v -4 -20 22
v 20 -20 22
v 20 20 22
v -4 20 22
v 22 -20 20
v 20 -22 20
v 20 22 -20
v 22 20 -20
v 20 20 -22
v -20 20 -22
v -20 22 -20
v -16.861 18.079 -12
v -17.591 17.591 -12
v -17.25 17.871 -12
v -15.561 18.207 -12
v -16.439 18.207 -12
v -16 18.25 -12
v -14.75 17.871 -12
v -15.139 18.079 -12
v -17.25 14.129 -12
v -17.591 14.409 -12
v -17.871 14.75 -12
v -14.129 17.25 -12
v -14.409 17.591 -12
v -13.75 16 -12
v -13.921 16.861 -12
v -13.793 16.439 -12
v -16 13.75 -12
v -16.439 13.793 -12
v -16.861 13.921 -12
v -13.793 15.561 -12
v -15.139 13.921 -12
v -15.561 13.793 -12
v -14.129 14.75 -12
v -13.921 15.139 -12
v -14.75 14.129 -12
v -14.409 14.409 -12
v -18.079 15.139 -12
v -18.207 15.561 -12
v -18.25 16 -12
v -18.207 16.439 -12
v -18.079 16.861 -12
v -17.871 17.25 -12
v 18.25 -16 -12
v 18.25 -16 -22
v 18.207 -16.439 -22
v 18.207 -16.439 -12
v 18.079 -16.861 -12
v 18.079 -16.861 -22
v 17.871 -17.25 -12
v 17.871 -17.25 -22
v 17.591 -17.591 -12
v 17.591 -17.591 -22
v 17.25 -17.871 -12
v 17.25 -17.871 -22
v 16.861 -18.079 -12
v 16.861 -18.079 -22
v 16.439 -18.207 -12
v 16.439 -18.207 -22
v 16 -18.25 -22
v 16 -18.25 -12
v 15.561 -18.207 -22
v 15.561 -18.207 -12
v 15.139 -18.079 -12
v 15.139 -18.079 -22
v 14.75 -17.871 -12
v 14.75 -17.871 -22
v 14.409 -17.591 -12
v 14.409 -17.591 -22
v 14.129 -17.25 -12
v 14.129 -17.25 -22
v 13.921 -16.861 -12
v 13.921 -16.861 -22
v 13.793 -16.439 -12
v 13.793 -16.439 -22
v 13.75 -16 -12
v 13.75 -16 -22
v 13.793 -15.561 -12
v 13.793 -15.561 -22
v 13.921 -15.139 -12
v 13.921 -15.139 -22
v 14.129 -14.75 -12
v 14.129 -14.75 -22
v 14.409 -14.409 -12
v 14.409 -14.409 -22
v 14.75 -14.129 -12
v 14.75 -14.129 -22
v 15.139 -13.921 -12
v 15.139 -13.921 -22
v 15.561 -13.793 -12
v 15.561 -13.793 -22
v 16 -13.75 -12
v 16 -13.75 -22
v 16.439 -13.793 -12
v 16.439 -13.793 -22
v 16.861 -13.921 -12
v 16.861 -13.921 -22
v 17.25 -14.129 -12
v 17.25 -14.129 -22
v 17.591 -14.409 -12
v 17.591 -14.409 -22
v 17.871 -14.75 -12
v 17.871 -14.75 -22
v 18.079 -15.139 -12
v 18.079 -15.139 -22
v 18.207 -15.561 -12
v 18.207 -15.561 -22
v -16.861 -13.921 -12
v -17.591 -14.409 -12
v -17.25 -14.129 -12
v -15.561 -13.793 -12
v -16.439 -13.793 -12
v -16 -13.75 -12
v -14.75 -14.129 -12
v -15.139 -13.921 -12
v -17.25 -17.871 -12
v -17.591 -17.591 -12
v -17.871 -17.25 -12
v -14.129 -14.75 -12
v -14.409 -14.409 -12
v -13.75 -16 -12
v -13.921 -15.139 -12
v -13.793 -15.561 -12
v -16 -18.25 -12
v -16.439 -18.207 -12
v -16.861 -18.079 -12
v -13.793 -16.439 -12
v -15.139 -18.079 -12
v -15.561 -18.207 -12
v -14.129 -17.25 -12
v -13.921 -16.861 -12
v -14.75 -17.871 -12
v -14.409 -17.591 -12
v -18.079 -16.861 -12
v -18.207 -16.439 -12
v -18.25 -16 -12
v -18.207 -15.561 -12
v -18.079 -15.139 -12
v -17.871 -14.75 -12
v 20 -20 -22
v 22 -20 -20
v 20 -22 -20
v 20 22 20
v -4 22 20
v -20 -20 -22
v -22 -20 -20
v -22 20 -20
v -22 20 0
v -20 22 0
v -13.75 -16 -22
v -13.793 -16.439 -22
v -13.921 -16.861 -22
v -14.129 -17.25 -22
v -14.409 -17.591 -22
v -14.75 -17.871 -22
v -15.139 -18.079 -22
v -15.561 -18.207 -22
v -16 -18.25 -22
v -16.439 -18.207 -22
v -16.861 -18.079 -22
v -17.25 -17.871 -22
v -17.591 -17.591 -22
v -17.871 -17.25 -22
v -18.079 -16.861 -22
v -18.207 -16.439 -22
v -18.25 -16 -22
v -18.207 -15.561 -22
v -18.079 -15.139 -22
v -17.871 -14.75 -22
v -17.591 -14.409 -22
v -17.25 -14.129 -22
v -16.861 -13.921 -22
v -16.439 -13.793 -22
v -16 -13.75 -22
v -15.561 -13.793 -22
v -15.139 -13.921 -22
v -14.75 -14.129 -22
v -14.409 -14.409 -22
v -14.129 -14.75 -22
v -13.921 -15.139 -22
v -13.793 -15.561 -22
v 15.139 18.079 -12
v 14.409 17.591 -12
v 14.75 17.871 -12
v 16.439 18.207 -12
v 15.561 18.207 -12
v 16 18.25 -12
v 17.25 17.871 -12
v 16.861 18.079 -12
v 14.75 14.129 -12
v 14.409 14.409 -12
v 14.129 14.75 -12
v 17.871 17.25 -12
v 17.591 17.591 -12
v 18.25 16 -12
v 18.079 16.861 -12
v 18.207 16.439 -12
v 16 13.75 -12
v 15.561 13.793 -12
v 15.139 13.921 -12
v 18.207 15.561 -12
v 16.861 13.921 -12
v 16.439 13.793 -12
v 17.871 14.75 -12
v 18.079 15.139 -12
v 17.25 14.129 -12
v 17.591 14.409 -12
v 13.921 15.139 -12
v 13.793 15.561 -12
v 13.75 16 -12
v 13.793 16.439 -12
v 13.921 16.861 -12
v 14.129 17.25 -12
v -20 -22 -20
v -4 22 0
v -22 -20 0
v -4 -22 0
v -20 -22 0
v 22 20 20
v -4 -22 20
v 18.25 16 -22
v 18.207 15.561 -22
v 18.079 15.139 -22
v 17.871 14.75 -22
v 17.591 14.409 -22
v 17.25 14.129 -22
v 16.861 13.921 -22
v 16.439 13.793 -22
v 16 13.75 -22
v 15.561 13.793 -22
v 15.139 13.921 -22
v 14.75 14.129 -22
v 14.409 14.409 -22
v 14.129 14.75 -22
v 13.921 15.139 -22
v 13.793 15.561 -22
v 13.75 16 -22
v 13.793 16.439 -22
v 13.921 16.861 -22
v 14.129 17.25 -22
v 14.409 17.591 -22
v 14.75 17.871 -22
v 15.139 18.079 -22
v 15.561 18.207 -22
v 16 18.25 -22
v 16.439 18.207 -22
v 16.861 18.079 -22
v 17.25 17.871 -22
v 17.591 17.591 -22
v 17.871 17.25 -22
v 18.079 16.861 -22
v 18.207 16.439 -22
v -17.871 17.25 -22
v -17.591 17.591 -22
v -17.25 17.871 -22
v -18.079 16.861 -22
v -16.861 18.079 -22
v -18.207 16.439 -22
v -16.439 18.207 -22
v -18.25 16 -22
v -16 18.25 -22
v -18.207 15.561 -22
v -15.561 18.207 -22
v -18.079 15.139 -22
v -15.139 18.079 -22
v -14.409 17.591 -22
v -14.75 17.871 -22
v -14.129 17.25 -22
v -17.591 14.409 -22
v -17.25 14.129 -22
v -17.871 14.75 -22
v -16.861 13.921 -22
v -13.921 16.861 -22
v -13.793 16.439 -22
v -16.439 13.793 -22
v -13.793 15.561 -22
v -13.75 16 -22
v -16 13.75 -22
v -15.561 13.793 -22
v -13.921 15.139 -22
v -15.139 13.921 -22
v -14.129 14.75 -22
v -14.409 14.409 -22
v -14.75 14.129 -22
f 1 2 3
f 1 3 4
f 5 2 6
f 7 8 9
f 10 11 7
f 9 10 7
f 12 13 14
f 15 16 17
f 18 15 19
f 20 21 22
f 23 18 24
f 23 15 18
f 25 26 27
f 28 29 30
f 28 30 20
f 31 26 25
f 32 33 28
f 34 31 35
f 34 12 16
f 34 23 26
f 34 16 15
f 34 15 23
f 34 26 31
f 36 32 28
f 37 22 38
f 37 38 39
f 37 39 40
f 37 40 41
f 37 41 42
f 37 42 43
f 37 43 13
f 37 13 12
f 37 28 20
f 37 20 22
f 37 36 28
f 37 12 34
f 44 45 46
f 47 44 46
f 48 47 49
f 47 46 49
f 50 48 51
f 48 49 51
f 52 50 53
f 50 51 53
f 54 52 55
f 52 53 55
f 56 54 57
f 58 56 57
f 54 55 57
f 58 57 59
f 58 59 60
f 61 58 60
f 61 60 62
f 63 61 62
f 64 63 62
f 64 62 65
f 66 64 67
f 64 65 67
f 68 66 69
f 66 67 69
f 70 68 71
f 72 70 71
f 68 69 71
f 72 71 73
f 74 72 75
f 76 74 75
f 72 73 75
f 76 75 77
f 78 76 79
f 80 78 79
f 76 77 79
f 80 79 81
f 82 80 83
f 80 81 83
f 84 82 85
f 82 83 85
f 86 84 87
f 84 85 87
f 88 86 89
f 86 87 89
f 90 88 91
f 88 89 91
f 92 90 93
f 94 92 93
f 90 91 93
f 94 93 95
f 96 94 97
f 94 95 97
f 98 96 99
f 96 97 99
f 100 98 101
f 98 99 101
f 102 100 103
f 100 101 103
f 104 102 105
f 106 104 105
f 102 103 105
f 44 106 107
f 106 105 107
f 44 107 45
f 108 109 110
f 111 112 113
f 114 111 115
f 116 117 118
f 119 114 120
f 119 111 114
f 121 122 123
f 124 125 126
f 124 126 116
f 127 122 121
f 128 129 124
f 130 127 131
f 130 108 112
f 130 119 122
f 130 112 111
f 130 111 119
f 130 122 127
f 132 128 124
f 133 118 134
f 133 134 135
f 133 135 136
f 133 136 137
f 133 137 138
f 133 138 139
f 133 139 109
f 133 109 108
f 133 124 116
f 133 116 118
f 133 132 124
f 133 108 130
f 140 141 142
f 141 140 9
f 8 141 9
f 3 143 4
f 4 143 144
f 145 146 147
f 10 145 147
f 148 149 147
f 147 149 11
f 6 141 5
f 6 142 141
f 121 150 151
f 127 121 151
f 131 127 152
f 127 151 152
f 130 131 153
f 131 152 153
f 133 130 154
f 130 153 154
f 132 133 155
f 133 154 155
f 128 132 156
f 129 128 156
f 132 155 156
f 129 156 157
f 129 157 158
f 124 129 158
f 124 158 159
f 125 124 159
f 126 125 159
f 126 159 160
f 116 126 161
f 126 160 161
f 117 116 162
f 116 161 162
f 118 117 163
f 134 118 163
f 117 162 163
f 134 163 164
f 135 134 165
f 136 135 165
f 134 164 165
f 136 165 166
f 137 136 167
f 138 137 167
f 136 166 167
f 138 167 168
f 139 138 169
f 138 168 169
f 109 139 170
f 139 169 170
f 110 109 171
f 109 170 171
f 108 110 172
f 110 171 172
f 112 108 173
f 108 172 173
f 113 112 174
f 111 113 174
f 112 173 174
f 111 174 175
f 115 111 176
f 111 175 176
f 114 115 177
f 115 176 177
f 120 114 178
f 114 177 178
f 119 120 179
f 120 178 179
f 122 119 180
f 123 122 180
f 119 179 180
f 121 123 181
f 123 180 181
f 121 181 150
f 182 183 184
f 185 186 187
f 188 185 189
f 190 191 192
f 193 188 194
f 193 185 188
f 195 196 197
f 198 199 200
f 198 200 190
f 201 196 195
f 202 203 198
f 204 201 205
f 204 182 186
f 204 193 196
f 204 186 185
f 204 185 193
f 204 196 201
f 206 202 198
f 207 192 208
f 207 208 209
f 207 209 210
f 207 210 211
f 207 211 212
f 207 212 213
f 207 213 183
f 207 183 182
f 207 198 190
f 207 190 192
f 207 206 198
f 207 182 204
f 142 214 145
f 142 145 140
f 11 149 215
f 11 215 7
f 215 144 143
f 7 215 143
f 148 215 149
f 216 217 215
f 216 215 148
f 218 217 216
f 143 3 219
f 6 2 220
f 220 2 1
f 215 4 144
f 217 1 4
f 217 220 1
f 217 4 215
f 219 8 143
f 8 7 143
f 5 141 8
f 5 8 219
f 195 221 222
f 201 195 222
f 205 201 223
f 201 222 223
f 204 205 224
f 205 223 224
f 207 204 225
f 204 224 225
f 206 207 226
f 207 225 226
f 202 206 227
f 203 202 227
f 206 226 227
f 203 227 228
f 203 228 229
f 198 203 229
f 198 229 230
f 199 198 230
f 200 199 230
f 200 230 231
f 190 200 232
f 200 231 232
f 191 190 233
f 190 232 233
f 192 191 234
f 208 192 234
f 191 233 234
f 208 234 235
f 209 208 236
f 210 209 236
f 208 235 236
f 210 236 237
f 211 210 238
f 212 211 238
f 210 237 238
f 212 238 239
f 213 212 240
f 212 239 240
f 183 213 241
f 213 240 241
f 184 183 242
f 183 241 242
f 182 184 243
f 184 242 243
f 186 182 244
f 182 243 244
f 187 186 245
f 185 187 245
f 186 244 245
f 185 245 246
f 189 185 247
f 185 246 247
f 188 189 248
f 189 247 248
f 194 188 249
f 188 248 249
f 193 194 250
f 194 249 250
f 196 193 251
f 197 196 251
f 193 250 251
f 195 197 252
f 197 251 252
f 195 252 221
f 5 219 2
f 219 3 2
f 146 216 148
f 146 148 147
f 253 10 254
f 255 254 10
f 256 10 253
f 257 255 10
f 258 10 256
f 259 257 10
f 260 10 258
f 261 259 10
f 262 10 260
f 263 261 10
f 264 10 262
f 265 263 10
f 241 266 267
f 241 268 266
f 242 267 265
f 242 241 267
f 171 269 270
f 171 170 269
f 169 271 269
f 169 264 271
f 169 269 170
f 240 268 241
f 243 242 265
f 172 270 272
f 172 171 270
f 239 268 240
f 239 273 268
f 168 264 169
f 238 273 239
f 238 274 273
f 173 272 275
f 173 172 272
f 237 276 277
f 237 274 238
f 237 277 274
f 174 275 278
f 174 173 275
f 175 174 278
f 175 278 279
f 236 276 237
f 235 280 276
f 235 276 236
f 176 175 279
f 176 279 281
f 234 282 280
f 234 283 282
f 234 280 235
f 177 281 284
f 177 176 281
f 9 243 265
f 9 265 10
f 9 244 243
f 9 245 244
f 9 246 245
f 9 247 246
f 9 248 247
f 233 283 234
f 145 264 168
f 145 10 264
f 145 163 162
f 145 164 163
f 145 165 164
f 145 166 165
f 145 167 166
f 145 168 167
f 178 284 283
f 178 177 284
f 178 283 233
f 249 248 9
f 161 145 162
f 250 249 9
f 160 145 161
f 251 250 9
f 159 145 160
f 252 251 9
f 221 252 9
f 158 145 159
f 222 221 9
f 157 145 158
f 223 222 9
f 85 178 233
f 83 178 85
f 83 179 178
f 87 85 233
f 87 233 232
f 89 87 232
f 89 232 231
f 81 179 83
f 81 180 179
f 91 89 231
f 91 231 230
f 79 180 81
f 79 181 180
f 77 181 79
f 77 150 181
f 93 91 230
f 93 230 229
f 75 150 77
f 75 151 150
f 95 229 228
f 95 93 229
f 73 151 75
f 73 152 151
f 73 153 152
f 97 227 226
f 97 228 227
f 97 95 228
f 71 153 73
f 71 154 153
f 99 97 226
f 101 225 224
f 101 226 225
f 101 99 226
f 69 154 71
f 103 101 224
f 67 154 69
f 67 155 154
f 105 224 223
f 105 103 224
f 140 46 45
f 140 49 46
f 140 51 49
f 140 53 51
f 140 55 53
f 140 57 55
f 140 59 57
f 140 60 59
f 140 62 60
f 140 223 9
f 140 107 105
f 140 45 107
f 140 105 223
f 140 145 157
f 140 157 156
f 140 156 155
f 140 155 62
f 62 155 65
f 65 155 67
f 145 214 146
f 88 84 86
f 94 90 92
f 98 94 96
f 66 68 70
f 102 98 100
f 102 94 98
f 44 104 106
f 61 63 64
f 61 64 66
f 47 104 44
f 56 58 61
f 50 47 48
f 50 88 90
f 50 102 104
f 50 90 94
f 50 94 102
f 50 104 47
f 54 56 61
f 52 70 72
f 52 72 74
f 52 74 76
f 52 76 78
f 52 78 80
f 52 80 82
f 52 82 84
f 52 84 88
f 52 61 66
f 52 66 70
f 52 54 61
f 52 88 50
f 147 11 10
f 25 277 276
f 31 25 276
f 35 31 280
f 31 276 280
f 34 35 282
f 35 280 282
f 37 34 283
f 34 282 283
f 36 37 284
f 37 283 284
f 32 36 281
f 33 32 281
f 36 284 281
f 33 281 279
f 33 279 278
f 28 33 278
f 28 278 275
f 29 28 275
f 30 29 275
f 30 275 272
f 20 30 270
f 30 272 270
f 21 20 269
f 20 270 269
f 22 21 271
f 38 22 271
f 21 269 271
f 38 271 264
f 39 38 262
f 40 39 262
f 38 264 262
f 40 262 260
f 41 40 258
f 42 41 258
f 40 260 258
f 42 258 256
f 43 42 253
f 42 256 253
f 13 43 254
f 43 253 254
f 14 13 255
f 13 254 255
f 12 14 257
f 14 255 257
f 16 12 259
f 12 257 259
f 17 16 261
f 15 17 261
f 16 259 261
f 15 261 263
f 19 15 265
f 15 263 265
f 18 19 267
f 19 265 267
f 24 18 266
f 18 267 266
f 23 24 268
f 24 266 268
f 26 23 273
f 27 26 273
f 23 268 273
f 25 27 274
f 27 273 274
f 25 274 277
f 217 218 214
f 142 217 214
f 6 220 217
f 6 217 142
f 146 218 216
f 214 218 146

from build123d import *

# Parameters (mm, degrees)
F1_DEPTH      = 22
F1_DEPTH_BACK = 22
F2_SIZE       = 2
F3_R          = 2.25
F4_DEPTH      = 10


with BuildPart() as f1:
    # F0 (on Front) → F1 (new body, two sides)
    with BuildSketch(Plane.XZ) as f1_sk:
        Polygon((22, -22), (22, 22), (-4, 22), (-4, 0), (-22, 0), (-22, -22), align=None)
    extrude(amount=F1_DEPTH)
    extrude(f1_sk.sketch, amount=-F1_DEPTH_BACK)

    # F2
    f2_edges = [f1.edges().sort_by_distance(p)[0] for p in [
        (22, 0, 22),
        (9, -22, 22),
        (9, 22, 22),
        (22, 22, 0),
        (22, -22, 0),
        (-22, -22, -11),
        (-22, 22, -11),
        (22, 0, -22),
        (0, 22, -22),
        (0, -22, -22),
        (-22, 0, -22),
    ]]
    chamfer(f2_edges, length=F2_SIZE)

    # F3 (on face) → F4 (cut)
    with BuildSketch(Plane(origin=(0, 0, -22), x_dir=(1, 0, 0), z_dir=(0, 0, -1))):
        with Locations((-16, 16)):
            Circle(F3_R)
        with Locations((16, 16)):
            Circle(F3_R)
        with Locations((16, -16)):
            Circle(F3_R)
        with Locations((-16, -16)):
            Circle(F3_R)
    extrude(amount=-F4_DEPTH, mode=Mode.SUBTRACT)


solid = f1.part
